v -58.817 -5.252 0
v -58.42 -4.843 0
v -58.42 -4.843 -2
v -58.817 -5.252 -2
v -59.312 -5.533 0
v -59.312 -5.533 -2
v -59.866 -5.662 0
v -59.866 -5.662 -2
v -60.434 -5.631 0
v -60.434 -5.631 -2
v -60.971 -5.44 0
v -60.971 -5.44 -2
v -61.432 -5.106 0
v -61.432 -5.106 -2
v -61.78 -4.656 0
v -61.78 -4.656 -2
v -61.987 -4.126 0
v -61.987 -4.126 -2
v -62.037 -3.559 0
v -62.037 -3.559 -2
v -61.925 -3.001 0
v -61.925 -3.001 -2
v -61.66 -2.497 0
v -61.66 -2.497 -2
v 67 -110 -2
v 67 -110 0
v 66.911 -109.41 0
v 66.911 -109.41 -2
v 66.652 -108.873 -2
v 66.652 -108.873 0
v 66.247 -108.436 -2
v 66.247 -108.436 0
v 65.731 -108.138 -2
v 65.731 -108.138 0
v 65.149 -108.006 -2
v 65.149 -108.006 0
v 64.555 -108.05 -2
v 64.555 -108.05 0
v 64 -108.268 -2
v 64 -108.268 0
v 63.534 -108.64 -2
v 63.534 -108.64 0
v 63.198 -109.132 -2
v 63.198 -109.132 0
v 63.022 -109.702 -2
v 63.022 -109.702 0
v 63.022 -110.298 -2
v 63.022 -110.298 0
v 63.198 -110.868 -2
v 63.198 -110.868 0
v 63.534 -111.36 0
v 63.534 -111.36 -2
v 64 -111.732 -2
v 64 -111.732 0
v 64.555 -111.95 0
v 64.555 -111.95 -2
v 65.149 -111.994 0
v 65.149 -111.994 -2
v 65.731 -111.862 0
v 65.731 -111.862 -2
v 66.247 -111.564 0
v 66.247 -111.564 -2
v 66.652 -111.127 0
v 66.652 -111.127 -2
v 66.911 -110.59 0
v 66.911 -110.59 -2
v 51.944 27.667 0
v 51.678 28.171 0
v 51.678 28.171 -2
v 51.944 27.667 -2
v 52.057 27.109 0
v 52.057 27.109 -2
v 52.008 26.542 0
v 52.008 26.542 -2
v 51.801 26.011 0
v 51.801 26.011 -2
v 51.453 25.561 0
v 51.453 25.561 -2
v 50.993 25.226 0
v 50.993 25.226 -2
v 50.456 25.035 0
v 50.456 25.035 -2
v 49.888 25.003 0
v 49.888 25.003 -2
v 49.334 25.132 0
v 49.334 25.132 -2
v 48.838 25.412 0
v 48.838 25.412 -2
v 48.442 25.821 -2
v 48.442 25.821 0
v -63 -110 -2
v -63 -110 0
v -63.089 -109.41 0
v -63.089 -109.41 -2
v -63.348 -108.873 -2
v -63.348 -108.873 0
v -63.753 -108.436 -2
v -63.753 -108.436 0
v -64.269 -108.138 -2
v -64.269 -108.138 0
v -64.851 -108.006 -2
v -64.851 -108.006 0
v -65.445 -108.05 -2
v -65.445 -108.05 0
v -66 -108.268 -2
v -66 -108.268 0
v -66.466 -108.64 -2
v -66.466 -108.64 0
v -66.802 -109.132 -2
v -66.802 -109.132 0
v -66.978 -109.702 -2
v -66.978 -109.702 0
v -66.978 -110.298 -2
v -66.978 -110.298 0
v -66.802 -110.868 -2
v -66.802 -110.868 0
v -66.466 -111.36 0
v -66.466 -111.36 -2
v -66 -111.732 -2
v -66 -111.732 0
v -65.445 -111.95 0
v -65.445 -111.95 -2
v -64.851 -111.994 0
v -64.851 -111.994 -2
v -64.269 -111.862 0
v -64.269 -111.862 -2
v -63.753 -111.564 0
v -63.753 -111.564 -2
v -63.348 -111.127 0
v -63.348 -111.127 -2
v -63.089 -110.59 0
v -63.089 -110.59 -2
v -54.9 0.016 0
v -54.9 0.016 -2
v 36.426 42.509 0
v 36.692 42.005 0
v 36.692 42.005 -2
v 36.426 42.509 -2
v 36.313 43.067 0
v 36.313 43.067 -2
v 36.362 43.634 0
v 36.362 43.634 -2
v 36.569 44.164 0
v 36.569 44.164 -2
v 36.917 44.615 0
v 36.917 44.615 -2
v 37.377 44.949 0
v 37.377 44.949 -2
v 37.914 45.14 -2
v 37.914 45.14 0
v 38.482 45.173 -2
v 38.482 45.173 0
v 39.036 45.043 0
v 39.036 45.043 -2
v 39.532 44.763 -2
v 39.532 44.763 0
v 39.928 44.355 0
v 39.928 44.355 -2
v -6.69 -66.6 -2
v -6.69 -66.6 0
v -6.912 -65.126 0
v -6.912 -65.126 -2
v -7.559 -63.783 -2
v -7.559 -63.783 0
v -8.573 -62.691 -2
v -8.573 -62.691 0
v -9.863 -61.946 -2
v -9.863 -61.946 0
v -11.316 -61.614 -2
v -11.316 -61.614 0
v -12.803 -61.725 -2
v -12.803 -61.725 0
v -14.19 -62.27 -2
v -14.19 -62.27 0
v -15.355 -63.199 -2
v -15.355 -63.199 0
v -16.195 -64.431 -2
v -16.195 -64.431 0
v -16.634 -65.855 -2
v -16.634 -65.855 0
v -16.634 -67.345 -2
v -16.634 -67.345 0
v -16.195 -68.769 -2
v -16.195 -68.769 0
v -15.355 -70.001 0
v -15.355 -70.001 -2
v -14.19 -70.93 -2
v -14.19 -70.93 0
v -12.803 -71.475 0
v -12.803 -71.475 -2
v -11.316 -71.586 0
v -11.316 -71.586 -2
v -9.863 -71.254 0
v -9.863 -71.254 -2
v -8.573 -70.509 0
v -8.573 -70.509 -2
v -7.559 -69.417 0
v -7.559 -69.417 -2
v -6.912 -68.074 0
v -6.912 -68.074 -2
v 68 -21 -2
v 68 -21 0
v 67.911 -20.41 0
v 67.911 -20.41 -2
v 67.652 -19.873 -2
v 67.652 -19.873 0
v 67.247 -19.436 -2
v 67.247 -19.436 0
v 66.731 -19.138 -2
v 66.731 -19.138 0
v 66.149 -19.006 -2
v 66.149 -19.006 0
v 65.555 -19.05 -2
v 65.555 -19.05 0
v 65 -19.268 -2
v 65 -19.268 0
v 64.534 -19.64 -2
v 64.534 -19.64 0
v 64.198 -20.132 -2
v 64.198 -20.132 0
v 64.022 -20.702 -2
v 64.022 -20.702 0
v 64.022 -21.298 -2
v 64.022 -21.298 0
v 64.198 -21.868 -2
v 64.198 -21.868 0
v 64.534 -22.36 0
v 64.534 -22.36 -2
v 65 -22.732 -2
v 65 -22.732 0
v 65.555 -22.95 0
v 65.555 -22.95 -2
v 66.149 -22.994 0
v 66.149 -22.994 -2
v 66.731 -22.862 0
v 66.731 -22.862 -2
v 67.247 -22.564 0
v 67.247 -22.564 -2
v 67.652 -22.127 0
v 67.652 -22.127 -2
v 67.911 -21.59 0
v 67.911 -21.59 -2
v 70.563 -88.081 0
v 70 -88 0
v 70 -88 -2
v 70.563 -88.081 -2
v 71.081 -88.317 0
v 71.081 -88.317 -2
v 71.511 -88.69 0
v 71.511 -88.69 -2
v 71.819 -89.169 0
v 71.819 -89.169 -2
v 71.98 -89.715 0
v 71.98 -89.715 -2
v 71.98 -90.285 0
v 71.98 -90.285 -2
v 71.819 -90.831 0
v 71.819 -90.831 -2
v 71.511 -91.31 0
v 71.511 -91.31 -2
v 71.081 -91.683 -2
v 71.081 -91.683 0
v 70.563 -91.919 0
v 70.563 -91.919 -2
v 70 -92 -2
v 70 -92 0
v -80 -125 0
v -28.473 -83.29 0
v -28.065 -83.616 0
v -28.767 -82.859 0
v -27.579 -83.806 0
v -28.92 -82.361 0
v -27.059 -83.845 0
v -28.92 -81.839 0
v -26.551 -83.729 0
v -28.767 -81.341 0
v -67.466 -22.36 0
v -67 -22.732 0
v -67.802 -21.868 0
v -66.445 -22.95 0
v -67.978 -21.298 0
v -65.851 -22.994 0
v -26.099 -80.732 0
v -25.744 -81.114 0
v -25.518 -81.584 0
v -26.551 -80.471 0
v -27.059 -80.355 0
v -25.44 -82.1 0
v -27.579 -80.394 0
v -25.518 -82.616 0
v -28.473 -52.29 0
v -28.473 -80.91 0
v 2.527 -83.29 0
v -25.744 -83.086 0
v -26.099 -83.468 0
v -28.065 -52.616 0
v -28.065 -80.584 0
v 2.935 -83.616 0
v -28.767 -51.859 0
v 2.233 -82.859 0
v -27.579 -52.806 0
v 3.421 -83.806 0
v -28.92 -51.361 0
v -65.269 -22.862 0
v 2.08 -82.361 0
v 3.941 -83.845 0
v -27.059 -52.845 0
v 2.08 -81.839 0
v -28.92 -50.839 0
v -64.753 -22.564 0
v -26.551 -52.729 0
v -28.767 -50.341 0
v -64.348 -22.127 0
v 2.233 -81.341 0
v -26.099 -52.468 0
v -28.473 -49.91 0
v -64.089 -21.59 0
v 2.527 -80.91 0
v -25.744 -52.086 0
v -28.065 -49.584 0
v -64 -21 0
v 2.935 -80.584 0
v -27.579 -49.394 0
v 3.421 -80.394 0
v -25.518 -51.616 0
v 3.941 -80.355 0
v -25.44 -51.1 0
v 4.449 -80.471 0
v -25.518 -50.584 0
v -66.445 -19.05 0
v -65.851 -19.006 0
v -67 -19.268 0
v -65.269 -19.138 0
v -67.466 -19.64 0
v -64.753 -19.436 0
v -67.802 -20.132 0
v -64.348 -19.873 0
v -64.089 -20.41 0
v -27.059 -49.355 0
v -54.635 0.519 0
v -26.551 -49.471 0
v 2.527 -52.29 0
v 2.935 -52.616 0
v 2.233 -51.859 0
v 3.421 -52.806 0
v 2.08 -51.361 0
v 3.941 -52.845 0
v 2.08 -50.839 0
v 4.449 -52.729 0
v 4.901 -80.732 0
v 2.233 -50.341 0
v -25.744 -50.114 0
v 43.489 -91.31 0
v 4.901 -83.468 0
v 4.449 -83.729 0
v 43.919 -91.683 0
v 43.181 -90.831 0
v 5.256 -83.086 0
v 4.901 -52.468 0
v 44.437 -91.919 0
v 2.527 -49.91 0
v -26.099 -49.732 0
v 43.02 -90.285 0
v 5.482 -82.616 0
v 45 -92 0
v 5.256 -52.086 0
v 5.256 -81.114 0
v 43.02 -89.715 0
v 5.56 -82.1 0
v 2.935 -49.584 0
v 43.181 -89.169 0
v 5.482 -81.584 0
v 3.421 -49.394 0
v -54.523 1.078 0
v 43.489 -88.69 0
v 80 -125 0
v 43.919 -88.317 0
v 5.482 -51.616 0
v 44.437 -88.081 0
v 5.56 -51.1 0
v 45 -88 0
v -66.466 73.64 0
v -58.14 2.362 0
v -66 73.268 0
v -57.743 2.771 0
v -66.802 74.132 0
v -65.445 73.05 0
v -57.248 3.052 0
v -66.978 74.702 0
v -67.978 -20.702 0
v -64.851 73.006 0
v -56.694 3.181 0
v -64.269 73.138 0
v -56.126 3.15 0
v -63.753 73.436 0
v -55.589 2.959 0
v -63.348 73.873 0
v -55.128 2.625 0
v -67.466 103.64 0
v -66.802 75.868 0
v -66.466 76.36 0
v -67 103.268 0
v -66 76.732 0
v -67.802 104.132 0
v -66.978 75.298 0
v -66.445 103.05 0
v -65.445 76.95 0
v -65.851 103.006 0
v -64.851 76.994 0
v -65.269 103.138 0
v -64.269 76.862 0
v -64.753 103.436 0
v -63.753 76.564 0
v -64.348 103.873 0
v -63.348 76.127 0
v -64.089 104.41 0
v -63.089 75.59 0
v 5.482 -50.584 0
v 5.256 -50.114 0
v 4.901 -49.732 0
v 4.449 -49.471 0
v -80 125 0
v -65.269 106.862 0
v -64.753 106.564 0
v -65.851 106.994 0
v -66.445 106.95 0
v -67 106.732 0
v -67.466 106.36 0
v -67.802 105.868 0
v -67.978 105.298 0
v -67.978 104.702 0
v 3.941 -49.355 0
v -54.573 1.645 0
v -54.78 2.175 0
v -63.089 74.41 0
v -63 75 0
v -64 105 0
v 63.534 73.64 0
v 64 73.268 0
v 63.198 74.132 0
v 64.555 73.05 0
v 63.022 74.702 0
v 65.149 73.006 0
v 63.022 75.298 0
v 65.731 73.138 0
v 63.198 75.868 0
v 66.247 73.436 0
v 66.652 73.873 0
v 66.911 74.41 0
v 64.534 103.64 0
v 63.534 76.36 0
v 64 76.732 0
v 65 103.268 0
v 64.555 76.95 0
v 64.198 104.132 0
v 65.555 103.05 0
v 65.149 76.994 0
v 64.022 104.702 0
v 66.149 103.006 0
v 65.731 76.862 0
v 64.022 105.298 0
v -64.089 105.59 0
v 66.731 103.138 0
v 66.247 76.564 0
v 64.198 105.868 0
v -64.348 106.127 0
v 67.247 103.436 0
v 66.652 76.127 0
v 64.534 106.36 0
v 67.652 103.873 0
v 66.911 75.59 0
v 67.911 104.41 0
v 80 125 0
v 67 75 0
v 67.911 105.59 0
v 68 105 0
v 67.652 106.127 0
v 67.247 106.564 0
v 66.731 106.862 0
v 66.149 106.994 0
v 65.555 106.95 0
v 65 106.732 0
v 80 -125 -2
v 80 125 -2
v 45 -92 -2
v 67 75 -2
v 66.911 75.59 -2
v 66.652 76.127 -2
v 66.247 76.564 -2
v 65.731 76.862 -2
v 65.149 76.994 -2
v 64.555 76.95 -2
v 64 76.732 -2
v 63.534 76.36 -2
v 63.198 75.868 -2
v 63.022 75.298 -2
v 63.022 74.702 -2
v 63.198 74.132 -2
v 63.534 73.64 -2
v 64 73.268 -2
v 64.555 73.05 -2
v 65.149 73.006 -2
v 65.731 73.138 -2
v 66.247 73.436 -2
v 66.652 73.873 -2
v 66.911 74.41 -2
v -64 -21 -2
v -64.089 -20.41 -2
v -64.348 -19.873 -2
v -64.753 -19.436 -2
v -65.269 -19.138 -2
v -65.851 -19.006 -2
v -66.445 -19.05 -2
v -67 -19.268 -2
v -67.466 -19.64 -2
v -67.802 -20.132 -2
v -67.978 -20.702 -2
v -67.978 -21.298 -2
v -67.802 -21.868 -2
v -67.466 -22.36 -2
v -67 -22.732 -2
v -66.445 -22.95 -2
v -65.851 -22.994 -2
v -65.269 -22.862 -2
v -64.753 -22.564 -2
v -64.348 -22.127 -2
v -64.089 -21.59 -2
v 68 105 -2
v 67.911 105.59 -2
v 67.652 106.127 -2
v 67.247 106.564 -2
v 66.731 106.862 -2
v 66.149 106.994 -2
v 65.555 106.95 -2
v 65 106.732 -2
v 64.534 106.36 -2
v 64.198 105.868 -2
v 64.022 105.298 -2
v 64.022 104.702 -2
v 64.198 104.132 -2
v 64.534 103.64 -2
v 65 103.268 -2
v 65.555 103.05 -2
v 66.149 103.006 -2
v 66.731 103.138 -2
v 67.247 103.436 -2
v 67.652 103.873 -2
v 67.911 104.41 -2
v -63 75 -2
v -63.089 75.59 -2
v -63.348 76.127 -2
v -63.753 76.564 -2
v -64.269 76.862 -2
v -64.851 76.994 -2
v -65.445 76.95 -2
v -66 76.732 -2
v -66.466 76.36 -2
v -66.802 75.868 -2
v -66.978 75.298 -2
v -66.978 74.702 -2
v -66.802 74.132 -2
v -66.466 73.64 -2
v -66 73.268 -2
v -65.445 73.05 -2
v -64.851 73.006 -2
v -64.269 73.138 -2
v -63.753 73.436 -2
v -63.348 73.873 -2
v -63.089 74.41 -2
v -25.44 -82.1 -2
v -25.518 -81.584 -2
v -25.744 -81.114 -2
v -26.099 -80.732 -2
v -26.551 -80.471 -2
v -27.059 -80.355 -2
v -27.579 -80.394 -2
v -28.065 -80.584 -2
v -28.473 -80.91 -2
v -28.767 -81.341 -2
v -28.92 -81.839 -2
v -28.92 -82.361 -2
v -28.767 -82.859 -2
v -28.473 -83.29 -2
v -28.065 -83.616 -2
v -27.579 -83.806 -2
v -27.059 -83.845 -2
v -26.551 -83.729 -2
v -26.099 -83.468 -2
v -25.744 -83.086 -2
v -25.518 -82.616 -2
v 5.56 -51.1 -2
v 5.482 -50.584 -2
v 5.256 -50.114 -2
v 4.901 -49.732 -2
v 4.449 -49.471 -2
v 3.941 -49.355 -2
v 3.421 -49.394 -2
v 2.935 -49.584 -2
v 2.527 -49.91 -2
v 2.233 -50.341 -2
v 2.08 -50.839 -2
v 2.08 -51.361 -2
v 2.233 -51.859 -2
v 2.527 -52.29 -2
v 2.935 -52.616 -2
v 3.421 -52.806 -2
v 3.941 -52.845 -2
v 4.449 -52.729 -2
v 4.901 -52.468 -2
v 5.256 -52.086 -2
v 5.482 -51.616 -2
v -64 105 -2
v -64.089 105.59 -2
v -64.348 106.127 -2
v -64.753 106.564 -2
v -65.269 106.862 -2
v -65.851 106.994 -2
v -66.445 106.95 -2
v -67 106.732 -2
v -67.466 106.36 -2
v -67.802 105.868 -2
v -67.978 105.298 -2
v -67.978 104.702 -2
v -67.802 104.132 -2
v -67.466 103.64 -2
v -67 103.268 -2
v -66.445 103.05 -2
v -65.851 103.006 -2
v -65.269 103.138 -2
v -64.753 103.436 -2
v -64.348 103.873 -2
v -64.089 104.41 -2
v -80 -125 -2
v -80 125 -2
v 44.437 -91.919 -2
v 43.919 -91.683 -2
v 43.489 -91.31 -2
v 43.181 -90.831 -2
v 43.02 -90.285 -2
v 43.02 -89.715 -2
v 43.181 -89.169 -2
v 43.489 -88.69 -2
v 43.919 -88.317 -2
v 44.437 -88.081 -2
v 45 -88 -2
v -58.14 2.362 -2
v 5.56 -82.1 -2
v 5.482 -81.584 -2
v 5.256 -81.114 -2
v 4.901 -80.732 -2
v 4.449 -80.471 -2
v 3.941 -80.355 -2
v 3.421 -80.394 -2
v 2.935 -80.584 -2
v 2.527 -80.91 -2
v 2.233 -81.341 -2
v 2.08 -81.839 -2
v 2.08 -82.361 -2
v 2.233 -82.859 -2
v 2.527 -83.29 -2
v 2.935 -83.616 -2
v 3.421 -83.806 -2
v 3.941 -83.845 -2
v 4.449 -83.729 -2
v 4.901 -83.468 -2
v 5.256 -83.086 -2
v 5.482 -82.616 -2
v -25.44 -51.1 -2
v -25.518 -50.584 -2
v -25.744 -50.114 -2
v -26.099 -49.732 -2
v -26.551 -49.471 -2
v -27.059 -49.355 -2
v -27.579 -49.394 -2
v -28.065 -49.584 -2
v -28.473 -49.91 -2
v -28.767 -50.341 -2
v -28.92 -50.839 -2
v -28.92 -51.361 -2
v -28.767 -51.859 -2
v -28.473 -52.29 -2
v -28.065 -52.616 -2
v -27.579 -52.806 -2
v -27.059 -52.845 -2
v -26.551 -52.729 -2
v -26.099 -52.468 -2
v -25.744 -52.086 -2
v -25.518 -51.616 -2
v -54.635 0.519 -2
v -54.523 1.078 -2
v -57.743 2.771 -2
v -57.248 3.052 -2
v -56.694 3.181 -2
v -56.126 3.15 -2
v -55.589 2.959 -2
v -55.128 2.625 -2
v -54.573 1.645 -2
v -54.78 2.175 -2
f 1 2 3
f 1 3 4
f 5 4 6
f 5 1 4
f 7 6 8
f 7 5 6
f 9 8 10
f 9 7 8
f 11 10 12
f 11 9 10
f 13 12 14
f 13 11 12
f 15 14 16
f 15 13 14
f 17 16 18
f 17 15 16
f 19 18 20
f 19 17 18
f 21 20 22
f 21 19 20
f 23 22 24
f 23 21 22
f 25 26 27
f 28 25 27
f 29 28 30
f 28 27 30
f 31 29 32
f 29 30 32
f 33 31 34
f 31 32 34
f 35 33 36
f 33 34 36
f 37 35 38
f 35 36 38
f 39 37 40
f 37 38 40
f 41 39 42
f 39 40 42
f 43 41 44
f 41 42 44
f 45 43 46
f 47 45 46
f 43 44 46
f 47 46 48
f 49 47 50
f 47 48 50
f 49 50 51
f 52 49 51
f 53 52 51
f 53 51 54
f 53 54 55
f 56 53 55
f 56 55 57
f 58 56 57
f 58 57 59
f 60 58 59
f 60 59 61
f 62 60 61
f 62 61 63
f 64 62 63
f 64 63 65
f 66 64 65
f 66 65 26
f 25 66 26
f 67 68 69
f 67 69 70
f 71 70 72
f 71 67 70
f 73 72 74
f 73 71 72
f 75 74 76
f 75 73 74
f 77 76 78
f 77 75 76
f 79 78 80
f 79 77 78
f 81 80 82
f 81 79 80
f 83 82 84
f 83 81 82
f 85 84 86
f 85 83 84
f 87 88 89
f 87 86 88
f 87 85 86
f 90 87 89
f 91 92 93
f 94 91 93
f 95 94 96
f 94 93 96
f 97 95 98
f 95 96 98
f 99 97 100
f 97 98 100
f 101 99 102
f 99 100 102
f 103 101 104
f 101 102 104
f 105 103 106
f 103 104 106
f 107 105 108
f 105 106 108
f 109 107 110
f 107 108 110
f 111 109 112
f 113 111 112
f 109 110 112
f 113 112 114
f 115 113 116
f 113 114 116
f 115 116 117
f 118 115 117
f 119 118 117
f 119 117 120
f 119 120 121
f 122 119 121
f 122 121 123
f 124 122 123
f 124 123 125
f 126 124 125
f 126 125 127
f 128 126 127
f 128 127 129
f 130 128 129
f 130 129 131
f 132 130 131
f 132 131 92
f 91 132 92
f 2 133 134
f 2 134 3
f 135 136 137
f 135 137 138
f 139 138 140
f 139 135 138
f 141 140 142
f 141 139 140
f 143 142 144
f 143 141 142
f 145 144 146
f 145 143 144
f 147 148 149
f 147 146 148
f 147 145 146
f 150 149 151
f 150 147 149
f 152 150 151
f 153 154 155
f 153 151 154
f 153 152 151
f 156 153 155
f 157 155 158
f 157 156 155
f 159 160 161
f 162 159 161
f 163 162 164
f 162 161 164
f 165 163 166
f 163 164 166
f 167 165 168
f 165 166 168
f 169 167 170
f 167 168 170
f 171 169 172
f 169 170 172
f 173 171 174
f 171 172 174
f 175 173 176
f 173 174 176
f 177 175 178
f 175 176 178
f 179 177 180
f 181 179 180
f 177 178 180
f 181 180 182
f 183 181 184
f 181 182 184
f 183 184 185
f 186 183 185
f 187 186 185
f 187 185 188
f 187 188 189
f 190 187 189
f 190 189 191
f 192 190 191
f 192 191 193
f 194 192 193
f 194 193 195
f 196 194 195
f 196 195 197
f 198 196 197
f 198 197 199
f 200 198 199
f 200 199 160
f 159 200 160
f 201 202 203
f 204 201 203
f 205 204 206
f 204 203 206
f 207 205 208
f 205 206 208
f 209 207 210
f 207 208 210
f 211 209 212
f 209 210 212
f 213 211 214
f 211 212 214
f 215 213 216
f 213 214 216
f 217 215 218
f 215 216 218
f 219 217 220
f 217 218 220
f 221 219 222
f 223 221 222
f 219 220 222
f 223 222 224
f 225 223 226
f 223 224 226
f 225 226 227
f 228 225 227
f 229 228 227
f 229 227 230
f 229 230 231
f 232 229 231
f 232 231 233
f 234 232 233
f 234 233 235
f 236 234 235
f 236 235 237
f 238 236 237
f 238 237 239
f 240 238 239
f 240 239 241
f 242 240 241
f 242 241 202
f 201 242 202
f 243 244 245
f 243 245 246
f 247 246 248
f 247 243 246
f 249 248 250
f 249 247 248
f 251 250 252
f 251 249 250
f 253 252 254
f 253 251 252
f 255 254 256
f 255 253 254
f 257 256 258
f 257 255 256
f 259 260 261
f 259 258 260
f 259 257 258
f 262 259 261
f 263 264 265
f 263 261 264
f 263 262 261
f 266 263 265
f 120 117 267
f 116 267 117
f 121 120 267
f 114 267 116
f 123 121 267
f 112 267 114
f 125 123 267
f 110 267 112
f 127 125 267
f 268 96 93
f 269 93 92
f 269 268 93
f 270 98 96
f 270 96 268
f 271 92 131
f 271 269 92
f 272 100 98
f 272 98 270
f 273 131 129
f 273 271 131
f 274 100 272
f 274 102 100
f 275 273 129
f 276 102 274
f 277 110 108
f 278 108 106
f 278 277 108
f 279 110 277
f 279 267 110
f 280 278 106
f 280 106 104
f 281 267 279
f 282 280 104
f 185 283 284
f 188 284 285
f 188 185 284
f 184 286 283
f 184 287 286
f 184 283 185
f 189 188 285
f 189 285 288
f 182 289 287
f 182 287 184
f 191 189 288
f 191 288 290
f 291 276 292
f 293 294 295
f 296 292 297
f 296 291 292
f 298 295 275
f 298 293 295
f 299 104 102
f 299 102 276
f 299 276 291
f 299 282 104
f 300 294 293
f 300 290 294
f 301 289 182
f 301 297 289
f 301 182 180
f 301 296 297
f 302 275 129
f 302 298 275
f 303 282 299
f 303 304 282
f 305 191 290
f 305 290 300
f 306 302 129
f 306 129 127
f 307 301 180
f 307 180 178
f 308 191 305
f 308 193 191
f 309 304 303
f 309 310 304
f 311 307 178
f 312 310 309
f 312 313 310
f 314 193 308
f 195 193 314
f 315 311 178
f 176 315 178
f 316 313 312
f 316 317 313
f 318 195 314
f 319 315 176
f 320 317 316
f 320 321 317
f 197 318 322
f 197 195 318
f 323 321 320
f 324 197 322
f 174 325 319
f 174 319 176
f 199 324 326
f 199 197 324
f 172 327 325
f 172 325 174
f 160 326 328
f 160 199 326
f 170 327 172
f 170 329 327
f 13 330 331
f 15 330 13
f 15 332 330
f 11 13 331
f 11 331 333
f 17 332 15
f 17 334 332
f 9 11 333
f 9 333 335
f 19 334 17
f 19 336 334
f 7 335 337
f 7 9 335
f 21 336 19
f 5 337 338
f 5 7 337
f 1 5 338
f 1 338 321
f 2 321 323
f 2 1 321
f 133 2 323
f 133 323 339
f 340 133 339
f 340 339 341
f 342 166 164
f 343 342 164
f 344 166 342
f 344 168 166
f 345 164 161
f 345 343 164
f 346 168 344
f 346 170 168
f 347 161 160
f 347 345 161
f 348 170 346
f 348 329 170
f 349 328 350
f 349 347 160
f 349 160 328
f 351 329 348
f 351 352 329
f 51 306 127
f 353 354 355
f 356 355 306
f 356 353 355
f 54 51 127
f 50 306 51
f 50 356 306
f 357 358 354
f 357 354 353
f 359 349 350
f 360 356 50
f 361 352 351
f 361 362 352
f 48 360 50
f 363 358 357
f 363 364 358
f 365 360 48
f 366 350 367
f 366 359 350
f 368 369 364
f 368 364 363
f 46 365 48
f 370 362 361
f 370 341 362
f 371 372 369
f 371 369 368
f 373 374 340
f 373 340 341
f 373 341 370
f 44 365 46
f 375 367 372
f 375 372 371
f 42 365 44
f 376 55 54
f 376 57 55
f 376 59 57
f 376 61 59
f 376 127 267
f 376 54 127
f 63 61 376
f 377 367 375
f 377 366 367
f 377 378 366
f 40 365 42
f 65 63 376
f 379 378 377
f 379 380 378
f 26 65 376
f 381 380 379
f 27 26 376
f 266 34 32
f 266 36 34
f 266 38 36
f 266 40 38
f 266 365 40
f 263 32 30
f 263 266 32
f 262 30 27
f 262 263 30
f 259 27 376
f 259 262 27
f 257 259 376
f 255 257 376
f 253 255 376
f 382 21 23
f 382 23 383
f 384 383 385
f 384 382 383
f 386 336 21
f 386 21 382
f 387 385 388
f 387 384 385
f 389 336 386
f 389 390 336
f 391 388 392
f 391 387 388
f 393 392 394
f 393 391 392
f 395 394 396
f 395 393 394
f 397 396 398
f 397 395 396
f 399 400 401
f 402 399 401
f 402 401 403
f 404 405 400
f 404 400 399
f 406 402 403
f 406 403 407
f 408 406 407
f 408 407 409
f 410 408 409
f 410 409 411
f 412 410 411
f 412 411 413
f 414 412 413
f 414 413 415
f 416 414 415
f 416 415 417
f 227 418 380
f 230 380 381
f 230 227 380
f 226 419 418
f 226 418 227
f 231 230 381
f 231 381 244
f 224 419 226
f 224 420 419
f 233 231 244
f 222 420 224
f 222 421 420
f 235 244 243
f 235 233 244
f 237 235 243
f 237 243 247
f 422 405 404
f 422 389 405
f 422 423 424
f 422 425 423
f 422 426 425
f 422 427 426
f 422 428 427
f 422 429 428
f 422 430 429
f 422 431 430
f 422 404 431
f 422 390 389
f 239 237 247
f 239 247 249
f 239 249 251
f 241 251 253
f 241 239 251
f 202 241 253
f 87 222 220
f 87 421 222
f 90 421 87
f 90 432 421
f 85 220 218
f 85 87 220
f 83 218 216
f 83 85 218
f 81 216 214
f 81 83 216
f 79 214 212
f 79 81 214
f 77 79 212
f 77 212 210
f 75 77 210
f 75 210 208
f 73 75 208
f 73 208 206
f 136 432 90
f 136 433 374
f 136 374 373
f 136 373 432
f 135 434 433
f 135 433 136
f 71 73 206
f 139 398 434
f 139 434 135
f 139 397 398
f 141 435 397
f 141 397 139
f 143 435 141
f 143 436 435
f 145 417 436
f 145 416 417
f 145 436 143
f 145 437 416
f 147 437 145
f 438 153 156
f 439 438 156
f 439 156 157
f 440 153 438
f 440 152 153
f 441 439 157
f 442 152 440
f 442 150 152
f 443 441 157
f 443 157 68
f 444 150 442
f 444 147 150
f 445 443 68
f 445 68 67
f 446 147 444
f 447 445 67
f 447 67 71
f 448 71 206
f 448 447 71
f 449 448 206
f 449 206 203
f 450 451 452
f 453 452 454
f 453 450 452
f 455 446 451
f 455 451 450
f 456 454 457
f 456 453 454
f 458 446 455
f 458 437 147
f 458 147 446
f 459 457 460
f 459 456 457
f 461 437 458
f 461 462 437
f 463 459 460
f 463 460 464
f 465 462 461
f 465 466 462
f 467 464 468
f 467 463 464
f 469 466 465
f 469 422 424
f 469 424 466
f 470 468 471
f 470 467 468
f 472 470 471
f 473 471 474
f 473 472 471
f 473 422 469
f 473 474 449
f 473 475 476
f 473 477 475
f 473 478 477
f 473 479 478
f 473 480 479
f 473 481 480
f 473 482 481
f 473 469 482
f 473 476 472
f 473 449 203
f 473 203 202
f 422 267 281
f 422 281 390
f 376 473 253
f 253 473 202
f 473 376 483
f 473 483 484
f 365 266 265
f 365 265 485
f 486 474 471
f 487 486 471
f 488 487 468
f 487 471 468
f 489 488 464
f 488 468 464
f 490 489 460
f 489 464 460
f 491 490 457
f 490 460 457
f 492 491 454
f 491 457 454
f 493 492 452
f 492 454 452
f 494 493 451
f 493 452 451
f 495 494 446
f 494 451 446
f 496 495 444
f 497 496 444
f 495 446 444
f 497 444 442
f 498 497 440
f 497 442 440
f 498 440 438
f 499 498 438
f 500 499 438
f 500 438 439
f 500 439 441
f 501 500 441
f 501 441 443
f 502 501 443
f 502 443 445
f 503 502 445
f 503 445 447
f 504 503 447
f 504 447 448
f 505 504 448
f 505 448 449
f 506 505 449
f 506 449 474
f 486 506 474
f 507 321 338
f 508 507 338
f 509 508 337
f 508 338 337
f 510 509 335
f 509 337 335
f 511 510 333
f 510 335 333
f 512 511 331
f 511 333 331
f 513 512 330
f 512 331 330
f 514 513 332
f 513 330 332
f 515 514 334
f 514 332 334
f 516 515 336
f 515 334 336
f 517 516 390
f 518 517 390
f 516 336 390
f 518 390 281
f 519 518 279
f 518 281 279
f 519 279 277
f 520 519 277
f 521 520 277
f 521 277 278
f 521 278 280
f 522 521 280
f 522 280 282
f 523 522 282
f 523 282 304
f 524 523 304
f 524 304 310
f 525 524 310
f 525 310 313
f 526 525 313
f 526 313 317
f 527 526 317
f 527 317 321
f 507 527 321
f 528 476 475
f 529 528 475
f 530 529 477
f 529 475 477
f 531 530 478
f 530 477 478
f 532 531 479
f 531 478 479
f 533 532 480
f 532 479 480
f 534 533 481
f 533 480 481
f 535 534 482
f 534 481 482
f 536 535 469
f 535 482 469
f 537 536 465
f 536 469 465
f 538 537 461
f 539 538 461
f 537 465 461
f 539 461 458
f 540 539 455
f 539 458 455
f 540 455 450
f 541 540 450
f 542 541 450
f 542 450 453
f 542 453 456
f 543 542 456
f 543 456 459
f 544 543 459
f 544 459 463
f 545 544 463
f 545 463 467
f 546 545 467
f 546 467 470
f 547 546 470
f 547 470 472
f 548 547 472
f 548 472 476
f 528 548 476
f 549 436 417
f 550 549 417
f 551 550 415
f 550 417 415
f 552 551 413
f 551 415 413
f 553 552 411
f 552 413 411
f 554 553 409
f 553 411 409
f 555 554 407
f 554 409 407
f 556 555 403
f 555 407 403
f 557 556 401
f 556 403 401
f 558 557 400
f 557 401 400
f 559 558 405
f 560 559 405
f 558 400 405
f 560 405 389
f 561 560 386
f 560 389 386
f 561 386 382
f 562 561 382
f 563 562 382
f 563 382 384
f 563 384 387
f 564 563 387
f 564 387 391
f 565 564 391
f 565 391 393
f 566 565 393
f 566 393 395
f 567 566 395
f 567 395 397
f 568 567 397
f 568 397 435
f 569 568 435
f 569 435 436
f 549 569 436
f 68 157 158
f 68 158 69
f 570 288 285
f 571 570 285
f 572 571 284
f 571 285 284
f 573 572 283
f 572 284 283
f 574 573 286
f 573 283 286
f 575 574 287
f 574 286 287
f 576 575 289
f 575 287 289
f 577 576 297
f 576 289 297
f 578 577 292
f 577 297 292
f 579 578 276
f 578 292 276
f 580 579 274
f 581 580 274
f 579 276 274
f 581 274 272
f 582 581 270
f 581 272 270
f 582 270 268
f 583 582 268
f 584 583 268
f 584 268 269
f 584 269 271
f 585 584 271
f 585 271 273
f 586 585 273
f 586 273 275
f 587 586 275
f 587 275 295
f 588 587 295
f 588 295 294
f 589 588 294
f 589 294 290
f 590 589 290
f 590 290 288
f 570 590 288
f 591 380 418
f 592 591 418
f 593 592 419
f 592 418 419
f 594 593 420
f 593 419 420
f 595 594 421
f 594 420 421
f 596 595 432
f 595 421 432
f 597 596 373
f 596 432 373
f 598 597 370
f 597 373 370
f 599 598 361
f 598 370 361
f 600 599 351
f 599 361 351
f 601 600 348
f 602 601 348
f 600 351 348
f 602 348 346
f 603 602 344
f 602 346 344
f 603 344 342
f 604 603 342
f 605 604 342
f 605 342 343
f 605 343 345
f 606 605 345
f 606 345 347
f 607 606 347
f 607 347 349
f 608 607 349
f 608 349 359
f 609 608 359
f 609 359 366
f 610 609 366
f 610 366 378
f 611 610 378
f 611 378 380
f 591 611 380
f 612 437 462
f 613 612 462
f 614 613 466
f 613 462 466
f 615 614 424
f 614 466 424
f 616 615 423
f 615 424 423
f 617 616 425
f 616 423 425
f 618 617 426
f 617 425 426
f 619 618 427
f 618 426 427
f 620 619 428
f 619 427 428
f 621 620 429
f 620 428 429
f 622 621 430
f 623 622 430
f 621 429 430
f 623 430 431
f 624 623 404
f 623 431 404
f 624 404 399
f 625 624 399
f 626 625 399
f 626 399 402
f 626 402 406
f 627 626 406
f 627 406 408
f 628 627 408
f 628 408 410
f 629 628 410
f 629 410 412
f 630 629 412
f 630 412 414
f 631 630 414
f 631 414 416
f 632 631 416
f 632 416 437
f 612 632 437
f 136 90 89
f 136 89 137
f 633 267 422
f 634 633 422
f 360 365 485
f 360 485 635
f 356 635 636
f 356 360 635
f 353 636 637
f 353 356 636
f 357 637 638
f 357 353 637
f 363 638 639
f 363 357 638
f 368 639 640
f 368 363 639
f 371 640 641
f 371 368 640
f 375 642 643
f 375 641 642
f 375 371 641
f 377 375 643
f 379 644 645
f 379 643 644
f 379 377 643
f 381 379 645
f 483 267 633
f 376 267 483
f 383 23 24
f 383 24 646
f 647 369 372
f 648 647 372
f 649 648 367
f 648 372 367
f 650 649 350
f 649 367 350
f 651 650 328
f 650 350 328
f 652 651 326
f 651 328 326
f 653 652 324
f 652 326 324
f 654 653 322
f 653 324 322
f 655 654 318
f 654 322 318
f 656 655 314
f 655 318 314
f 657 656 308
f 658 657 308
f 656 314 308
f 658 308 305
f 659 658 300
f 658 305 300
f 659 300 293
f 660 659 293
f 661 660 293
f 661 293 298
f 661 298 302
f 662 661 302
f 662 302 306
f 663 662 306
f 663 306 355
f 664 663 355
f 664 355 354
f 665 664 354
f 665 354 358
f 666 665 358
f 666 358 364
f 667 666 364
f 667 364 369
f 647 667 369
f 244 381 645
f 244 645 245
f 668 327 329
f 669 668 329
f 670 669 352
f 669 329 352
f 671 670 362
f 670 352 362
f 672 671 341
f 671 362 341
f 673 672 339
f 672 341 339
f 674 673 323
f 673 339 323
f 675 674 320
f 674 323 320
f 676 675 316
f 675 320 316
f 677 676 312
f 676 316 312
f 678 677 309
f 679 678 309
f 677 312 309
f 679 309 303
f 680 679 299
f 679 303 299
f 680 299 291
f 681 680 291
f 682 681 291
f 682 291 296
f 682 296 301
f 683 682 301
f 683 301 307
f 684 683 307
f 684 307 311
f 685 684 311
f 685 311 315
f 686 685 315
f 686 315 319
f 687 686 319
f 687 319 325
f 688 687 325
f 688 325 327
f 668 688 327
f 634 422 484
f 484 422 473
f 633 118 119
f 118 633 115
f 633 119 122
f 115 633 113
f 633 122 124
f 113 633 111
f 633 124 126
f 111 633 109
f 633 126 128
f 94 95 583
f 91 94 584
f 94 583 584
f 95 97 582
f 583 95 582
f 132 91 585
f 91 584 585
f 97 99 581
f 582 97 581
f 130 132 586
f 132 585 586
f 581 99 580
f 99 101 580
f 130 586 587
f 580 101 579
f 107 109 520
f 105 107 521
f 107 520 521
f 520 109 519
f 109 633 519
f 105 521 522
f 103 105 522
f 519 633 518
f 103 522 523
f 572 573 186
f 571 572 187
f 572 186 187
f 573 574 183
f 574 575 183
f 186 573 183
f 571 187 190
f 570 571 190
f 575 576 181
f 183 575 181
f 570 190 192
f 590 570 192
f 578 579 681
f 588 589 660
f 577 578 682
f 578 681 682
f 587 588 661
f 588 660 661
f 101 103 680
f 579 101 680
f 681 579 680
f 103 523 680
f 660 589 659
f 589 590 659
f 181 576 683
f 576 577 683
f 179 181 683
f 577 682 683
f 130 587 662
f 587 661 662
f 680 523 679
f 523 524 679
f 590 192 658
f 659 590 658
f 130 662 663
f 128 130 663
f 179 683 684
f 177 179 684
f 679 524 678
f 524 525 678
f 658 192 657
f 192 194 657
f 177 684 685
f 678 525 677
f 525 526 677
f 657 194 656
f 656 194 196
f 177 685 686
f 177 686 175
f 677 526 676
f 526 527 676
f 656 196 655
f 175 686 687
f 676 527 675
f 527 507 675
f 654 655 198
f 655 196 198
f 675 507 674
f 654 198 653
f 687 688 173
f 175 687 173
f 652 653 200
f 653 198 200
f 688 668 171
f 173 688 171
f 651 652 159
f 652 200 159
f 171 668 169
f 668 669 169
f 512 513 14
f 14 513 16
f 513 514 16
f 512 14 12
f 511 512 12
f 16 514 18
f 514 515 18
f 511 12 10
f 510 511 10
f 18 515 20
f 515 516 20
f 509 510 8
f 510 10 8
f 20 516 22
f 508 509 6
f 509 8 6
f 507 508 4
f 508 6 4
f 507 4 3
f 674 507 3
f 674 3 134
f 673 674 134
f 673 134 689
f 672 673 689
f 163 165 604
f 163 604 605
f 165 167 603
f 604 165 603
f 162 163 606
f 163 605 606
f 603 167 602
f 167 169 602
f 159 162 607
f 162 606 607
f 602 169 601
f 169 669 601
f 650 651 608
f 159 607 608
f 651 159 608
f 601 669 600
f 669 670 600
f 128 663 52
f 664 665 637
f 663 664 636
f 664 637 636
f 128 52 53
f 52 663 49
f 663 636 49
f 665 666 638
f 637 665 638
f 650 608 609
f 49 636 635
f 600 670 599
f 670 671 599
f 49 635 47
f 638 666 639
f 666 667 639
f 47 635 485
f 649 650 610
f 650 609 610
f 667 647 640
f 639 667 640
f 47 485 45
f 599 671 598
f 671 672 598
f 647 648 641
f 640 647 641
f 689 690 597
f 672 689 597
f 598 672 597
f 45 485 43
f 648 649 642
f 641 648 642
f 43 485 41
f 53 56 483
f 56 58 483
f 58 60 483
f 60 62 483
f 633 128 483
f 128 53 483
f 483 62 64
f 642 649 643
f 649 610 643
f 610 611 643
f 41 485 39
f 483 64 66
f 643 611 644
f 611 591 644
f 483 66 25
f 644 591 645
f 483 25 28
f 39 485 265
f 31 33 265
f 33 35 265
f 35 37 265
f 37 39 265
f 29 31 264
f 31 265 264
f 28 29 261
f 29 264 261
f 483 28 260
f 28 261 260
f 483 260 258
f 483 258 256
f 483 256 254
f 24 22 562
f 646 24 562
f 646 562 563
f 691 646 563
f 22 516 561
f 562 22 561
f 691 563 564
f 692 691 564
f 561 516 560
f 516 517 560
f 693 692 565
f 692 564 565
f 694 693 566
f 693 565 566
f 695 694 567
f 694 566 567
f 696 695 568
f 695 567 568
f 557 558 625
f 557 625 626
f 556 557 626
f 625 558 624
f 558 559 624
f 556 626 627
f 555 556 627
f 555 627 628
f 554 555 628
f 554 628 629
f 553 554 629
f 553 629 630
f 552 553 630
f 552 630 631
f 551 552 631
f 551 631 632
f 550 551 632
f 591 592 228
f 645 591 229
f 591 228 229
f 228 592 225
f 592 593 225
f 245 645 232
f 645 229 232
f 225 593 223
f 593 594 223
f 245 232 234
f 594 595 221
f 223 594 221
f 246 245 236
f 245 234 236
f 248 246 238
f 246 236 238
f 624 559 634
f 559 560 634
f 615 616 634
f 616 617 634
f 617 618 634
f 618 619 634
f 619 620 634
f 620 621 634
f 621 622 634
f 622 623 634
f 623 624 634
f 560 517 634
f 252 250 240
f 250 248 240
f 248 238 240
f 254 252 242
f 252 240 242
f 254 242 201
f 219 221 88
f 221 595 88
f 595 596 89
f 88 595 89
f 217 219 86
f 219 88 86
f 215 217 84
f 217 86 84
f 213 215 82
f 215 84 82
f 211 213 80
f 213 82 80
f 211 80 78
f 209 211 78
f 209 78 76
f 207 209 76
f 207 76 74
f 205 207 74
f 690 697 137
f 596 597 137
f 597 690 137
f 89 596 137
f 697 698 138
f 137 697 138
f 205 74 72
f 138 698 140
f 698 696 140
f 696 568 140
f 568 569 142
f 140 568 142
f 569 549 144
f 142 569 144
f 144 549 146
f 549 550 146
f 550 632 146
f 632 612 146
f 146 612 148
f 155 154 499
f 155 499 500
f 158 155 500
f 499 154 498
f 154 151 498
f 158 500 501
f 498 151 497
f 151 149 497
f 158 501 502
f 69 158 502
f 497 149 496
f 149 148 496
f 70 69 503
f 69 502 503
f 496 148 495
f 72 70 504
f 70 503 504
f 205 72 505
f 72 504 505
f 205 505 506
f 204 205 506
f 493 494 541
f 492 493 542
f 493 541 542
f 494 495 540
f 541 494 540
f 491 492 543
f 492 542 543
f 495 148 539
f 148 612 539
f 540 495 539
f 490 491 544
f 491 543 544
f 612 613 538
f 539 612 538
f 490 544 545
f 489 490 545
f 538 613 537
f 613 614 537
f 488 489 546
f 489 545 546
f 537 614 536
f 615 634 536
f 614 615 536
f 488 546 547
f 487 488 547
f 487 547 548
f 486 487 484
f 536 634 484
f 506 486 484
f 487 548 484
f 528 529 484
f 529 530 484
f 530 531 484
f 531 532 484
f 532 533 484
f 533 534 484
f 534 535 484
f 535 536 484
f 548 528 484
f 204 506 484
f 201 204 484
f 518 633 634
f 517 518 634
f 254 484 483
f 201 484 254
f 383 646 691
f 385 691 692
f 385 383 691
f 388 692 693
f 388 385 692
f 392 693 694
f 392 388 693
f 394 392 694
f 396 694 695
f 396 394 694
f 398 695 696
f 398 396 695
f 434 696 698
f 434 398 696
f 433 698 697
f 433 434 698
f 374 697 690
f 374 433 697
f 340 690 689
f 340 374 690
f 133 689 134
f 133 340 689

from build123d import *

# Parameters (mm, degrees)
SKETCH1_W           = 160
SKETCH1_H           = 250
BOSS_EXTRUDE1_DEPTH = 2
SKETCH2_R           = 5
SKETCH2_R_2         = 2
CUT_EXTRUDE1_DEPTH  = 149.421696527
SKETCH3_R           = 1.75
CUT_EXTRUDE2_DEPTH  = 10


with BuildPart() as part:
    # Sketch1 → Boss-Extrude1 (new body)
    with BuildSketch(Plane.XY):
        Rectangle(SKETCH1_W, SKETCH1_H)
    extrude(amount=-BOSS_EXTRUDE1_DEPTH)

    # Sketch2 → Cut-Extrude1 (cut, through all)
    with BuildSketch(Plane.XY):
        with Locations((-11.69, -66.6)):
            Circle(SKETCH2_R)
        with Locations((-66, -21)):
            Circle(SKETCH2_R_2)
        with Locations((66, -21)):
            Circle(SKETCH2_R_2)
        with Locations((-66, 105)):
            Circle(SKETCH2_R_2)
        with Locations((66, 105)):
            Circle(SKETCH2_R_2)
        with Locations((65, 75)):
            Circle(SKETCH2_R_2)
        with Locations((-65, 75)):
            Circle(SKETCH2_R_2)
        with Locations((-65, -110)):
            Circle(SKETCH2_R_2)
        with Locations((65, -110)):
            Circle(SKETCH2_R_2)
        with BuildLine():
            Line((70, -92), (45, -92))
            ThreePointArc((45, -92), (43, -90), (45, -88))
            Line((45, -88), (70, -88))
            ThreePointArc((70, -88), (72, -90), (70, -92))
        make_face()
        with BuildLine():
            Line((-54.900342972, 0.015637751), (-58.420342972, -4.843333333))
            ThreePointArc((-58.420342972, -4.843333333), (-61.213333333, -5.289657028), (-61.659657028, -2.496666667))
            Line((-61.659657028, -2.496666667), (-58.139657028, 2.362304418))
            ThreePointArc((-58.139657028, 2.362304418), (-55.346666667, 2.808628113), (-54.900342972, 0.015637751))
        make_face()
        with BuildLine():
            Line((39.928448331, 44.355), (51.678448331, 28.17051669))
            ThreePointArc((51.678448331, 28.17051669), (51.235, 25.377068359), (48.441551669, 25.82051669))
            Line((48.441551669, 25.82051669), (36.691551669, 42.005))
            ThreePointArc((36.691551669, 42.005), (37.135, 44.798448331), (39.928448331, 44.355))
        make_face()
    extrude(amount=-CUT_EXTRUDE1_DEPTH, mode=Mode.SUBTRACT)

    # Sketch3 → Cut-Extrude2 (cut)
    with BuildSketch(Plane.XY):
        with Locations((-27.19, -51.1)):
            Circle(SKETCH3_R)
        with Locations((3.81, -51.1)):
            Circle(SKETCH3_R)
        with Locations((3.81, -82.1)):
            Circle(SKETCH3_R)
        with Locations((-27.19, -82.1)):
            Circle(SKETCH3_R)
    extrude(amount=-CUT_EXTRUDE2_DEPTH, mode=Mode.SUBTRACT)


solid = part.part
